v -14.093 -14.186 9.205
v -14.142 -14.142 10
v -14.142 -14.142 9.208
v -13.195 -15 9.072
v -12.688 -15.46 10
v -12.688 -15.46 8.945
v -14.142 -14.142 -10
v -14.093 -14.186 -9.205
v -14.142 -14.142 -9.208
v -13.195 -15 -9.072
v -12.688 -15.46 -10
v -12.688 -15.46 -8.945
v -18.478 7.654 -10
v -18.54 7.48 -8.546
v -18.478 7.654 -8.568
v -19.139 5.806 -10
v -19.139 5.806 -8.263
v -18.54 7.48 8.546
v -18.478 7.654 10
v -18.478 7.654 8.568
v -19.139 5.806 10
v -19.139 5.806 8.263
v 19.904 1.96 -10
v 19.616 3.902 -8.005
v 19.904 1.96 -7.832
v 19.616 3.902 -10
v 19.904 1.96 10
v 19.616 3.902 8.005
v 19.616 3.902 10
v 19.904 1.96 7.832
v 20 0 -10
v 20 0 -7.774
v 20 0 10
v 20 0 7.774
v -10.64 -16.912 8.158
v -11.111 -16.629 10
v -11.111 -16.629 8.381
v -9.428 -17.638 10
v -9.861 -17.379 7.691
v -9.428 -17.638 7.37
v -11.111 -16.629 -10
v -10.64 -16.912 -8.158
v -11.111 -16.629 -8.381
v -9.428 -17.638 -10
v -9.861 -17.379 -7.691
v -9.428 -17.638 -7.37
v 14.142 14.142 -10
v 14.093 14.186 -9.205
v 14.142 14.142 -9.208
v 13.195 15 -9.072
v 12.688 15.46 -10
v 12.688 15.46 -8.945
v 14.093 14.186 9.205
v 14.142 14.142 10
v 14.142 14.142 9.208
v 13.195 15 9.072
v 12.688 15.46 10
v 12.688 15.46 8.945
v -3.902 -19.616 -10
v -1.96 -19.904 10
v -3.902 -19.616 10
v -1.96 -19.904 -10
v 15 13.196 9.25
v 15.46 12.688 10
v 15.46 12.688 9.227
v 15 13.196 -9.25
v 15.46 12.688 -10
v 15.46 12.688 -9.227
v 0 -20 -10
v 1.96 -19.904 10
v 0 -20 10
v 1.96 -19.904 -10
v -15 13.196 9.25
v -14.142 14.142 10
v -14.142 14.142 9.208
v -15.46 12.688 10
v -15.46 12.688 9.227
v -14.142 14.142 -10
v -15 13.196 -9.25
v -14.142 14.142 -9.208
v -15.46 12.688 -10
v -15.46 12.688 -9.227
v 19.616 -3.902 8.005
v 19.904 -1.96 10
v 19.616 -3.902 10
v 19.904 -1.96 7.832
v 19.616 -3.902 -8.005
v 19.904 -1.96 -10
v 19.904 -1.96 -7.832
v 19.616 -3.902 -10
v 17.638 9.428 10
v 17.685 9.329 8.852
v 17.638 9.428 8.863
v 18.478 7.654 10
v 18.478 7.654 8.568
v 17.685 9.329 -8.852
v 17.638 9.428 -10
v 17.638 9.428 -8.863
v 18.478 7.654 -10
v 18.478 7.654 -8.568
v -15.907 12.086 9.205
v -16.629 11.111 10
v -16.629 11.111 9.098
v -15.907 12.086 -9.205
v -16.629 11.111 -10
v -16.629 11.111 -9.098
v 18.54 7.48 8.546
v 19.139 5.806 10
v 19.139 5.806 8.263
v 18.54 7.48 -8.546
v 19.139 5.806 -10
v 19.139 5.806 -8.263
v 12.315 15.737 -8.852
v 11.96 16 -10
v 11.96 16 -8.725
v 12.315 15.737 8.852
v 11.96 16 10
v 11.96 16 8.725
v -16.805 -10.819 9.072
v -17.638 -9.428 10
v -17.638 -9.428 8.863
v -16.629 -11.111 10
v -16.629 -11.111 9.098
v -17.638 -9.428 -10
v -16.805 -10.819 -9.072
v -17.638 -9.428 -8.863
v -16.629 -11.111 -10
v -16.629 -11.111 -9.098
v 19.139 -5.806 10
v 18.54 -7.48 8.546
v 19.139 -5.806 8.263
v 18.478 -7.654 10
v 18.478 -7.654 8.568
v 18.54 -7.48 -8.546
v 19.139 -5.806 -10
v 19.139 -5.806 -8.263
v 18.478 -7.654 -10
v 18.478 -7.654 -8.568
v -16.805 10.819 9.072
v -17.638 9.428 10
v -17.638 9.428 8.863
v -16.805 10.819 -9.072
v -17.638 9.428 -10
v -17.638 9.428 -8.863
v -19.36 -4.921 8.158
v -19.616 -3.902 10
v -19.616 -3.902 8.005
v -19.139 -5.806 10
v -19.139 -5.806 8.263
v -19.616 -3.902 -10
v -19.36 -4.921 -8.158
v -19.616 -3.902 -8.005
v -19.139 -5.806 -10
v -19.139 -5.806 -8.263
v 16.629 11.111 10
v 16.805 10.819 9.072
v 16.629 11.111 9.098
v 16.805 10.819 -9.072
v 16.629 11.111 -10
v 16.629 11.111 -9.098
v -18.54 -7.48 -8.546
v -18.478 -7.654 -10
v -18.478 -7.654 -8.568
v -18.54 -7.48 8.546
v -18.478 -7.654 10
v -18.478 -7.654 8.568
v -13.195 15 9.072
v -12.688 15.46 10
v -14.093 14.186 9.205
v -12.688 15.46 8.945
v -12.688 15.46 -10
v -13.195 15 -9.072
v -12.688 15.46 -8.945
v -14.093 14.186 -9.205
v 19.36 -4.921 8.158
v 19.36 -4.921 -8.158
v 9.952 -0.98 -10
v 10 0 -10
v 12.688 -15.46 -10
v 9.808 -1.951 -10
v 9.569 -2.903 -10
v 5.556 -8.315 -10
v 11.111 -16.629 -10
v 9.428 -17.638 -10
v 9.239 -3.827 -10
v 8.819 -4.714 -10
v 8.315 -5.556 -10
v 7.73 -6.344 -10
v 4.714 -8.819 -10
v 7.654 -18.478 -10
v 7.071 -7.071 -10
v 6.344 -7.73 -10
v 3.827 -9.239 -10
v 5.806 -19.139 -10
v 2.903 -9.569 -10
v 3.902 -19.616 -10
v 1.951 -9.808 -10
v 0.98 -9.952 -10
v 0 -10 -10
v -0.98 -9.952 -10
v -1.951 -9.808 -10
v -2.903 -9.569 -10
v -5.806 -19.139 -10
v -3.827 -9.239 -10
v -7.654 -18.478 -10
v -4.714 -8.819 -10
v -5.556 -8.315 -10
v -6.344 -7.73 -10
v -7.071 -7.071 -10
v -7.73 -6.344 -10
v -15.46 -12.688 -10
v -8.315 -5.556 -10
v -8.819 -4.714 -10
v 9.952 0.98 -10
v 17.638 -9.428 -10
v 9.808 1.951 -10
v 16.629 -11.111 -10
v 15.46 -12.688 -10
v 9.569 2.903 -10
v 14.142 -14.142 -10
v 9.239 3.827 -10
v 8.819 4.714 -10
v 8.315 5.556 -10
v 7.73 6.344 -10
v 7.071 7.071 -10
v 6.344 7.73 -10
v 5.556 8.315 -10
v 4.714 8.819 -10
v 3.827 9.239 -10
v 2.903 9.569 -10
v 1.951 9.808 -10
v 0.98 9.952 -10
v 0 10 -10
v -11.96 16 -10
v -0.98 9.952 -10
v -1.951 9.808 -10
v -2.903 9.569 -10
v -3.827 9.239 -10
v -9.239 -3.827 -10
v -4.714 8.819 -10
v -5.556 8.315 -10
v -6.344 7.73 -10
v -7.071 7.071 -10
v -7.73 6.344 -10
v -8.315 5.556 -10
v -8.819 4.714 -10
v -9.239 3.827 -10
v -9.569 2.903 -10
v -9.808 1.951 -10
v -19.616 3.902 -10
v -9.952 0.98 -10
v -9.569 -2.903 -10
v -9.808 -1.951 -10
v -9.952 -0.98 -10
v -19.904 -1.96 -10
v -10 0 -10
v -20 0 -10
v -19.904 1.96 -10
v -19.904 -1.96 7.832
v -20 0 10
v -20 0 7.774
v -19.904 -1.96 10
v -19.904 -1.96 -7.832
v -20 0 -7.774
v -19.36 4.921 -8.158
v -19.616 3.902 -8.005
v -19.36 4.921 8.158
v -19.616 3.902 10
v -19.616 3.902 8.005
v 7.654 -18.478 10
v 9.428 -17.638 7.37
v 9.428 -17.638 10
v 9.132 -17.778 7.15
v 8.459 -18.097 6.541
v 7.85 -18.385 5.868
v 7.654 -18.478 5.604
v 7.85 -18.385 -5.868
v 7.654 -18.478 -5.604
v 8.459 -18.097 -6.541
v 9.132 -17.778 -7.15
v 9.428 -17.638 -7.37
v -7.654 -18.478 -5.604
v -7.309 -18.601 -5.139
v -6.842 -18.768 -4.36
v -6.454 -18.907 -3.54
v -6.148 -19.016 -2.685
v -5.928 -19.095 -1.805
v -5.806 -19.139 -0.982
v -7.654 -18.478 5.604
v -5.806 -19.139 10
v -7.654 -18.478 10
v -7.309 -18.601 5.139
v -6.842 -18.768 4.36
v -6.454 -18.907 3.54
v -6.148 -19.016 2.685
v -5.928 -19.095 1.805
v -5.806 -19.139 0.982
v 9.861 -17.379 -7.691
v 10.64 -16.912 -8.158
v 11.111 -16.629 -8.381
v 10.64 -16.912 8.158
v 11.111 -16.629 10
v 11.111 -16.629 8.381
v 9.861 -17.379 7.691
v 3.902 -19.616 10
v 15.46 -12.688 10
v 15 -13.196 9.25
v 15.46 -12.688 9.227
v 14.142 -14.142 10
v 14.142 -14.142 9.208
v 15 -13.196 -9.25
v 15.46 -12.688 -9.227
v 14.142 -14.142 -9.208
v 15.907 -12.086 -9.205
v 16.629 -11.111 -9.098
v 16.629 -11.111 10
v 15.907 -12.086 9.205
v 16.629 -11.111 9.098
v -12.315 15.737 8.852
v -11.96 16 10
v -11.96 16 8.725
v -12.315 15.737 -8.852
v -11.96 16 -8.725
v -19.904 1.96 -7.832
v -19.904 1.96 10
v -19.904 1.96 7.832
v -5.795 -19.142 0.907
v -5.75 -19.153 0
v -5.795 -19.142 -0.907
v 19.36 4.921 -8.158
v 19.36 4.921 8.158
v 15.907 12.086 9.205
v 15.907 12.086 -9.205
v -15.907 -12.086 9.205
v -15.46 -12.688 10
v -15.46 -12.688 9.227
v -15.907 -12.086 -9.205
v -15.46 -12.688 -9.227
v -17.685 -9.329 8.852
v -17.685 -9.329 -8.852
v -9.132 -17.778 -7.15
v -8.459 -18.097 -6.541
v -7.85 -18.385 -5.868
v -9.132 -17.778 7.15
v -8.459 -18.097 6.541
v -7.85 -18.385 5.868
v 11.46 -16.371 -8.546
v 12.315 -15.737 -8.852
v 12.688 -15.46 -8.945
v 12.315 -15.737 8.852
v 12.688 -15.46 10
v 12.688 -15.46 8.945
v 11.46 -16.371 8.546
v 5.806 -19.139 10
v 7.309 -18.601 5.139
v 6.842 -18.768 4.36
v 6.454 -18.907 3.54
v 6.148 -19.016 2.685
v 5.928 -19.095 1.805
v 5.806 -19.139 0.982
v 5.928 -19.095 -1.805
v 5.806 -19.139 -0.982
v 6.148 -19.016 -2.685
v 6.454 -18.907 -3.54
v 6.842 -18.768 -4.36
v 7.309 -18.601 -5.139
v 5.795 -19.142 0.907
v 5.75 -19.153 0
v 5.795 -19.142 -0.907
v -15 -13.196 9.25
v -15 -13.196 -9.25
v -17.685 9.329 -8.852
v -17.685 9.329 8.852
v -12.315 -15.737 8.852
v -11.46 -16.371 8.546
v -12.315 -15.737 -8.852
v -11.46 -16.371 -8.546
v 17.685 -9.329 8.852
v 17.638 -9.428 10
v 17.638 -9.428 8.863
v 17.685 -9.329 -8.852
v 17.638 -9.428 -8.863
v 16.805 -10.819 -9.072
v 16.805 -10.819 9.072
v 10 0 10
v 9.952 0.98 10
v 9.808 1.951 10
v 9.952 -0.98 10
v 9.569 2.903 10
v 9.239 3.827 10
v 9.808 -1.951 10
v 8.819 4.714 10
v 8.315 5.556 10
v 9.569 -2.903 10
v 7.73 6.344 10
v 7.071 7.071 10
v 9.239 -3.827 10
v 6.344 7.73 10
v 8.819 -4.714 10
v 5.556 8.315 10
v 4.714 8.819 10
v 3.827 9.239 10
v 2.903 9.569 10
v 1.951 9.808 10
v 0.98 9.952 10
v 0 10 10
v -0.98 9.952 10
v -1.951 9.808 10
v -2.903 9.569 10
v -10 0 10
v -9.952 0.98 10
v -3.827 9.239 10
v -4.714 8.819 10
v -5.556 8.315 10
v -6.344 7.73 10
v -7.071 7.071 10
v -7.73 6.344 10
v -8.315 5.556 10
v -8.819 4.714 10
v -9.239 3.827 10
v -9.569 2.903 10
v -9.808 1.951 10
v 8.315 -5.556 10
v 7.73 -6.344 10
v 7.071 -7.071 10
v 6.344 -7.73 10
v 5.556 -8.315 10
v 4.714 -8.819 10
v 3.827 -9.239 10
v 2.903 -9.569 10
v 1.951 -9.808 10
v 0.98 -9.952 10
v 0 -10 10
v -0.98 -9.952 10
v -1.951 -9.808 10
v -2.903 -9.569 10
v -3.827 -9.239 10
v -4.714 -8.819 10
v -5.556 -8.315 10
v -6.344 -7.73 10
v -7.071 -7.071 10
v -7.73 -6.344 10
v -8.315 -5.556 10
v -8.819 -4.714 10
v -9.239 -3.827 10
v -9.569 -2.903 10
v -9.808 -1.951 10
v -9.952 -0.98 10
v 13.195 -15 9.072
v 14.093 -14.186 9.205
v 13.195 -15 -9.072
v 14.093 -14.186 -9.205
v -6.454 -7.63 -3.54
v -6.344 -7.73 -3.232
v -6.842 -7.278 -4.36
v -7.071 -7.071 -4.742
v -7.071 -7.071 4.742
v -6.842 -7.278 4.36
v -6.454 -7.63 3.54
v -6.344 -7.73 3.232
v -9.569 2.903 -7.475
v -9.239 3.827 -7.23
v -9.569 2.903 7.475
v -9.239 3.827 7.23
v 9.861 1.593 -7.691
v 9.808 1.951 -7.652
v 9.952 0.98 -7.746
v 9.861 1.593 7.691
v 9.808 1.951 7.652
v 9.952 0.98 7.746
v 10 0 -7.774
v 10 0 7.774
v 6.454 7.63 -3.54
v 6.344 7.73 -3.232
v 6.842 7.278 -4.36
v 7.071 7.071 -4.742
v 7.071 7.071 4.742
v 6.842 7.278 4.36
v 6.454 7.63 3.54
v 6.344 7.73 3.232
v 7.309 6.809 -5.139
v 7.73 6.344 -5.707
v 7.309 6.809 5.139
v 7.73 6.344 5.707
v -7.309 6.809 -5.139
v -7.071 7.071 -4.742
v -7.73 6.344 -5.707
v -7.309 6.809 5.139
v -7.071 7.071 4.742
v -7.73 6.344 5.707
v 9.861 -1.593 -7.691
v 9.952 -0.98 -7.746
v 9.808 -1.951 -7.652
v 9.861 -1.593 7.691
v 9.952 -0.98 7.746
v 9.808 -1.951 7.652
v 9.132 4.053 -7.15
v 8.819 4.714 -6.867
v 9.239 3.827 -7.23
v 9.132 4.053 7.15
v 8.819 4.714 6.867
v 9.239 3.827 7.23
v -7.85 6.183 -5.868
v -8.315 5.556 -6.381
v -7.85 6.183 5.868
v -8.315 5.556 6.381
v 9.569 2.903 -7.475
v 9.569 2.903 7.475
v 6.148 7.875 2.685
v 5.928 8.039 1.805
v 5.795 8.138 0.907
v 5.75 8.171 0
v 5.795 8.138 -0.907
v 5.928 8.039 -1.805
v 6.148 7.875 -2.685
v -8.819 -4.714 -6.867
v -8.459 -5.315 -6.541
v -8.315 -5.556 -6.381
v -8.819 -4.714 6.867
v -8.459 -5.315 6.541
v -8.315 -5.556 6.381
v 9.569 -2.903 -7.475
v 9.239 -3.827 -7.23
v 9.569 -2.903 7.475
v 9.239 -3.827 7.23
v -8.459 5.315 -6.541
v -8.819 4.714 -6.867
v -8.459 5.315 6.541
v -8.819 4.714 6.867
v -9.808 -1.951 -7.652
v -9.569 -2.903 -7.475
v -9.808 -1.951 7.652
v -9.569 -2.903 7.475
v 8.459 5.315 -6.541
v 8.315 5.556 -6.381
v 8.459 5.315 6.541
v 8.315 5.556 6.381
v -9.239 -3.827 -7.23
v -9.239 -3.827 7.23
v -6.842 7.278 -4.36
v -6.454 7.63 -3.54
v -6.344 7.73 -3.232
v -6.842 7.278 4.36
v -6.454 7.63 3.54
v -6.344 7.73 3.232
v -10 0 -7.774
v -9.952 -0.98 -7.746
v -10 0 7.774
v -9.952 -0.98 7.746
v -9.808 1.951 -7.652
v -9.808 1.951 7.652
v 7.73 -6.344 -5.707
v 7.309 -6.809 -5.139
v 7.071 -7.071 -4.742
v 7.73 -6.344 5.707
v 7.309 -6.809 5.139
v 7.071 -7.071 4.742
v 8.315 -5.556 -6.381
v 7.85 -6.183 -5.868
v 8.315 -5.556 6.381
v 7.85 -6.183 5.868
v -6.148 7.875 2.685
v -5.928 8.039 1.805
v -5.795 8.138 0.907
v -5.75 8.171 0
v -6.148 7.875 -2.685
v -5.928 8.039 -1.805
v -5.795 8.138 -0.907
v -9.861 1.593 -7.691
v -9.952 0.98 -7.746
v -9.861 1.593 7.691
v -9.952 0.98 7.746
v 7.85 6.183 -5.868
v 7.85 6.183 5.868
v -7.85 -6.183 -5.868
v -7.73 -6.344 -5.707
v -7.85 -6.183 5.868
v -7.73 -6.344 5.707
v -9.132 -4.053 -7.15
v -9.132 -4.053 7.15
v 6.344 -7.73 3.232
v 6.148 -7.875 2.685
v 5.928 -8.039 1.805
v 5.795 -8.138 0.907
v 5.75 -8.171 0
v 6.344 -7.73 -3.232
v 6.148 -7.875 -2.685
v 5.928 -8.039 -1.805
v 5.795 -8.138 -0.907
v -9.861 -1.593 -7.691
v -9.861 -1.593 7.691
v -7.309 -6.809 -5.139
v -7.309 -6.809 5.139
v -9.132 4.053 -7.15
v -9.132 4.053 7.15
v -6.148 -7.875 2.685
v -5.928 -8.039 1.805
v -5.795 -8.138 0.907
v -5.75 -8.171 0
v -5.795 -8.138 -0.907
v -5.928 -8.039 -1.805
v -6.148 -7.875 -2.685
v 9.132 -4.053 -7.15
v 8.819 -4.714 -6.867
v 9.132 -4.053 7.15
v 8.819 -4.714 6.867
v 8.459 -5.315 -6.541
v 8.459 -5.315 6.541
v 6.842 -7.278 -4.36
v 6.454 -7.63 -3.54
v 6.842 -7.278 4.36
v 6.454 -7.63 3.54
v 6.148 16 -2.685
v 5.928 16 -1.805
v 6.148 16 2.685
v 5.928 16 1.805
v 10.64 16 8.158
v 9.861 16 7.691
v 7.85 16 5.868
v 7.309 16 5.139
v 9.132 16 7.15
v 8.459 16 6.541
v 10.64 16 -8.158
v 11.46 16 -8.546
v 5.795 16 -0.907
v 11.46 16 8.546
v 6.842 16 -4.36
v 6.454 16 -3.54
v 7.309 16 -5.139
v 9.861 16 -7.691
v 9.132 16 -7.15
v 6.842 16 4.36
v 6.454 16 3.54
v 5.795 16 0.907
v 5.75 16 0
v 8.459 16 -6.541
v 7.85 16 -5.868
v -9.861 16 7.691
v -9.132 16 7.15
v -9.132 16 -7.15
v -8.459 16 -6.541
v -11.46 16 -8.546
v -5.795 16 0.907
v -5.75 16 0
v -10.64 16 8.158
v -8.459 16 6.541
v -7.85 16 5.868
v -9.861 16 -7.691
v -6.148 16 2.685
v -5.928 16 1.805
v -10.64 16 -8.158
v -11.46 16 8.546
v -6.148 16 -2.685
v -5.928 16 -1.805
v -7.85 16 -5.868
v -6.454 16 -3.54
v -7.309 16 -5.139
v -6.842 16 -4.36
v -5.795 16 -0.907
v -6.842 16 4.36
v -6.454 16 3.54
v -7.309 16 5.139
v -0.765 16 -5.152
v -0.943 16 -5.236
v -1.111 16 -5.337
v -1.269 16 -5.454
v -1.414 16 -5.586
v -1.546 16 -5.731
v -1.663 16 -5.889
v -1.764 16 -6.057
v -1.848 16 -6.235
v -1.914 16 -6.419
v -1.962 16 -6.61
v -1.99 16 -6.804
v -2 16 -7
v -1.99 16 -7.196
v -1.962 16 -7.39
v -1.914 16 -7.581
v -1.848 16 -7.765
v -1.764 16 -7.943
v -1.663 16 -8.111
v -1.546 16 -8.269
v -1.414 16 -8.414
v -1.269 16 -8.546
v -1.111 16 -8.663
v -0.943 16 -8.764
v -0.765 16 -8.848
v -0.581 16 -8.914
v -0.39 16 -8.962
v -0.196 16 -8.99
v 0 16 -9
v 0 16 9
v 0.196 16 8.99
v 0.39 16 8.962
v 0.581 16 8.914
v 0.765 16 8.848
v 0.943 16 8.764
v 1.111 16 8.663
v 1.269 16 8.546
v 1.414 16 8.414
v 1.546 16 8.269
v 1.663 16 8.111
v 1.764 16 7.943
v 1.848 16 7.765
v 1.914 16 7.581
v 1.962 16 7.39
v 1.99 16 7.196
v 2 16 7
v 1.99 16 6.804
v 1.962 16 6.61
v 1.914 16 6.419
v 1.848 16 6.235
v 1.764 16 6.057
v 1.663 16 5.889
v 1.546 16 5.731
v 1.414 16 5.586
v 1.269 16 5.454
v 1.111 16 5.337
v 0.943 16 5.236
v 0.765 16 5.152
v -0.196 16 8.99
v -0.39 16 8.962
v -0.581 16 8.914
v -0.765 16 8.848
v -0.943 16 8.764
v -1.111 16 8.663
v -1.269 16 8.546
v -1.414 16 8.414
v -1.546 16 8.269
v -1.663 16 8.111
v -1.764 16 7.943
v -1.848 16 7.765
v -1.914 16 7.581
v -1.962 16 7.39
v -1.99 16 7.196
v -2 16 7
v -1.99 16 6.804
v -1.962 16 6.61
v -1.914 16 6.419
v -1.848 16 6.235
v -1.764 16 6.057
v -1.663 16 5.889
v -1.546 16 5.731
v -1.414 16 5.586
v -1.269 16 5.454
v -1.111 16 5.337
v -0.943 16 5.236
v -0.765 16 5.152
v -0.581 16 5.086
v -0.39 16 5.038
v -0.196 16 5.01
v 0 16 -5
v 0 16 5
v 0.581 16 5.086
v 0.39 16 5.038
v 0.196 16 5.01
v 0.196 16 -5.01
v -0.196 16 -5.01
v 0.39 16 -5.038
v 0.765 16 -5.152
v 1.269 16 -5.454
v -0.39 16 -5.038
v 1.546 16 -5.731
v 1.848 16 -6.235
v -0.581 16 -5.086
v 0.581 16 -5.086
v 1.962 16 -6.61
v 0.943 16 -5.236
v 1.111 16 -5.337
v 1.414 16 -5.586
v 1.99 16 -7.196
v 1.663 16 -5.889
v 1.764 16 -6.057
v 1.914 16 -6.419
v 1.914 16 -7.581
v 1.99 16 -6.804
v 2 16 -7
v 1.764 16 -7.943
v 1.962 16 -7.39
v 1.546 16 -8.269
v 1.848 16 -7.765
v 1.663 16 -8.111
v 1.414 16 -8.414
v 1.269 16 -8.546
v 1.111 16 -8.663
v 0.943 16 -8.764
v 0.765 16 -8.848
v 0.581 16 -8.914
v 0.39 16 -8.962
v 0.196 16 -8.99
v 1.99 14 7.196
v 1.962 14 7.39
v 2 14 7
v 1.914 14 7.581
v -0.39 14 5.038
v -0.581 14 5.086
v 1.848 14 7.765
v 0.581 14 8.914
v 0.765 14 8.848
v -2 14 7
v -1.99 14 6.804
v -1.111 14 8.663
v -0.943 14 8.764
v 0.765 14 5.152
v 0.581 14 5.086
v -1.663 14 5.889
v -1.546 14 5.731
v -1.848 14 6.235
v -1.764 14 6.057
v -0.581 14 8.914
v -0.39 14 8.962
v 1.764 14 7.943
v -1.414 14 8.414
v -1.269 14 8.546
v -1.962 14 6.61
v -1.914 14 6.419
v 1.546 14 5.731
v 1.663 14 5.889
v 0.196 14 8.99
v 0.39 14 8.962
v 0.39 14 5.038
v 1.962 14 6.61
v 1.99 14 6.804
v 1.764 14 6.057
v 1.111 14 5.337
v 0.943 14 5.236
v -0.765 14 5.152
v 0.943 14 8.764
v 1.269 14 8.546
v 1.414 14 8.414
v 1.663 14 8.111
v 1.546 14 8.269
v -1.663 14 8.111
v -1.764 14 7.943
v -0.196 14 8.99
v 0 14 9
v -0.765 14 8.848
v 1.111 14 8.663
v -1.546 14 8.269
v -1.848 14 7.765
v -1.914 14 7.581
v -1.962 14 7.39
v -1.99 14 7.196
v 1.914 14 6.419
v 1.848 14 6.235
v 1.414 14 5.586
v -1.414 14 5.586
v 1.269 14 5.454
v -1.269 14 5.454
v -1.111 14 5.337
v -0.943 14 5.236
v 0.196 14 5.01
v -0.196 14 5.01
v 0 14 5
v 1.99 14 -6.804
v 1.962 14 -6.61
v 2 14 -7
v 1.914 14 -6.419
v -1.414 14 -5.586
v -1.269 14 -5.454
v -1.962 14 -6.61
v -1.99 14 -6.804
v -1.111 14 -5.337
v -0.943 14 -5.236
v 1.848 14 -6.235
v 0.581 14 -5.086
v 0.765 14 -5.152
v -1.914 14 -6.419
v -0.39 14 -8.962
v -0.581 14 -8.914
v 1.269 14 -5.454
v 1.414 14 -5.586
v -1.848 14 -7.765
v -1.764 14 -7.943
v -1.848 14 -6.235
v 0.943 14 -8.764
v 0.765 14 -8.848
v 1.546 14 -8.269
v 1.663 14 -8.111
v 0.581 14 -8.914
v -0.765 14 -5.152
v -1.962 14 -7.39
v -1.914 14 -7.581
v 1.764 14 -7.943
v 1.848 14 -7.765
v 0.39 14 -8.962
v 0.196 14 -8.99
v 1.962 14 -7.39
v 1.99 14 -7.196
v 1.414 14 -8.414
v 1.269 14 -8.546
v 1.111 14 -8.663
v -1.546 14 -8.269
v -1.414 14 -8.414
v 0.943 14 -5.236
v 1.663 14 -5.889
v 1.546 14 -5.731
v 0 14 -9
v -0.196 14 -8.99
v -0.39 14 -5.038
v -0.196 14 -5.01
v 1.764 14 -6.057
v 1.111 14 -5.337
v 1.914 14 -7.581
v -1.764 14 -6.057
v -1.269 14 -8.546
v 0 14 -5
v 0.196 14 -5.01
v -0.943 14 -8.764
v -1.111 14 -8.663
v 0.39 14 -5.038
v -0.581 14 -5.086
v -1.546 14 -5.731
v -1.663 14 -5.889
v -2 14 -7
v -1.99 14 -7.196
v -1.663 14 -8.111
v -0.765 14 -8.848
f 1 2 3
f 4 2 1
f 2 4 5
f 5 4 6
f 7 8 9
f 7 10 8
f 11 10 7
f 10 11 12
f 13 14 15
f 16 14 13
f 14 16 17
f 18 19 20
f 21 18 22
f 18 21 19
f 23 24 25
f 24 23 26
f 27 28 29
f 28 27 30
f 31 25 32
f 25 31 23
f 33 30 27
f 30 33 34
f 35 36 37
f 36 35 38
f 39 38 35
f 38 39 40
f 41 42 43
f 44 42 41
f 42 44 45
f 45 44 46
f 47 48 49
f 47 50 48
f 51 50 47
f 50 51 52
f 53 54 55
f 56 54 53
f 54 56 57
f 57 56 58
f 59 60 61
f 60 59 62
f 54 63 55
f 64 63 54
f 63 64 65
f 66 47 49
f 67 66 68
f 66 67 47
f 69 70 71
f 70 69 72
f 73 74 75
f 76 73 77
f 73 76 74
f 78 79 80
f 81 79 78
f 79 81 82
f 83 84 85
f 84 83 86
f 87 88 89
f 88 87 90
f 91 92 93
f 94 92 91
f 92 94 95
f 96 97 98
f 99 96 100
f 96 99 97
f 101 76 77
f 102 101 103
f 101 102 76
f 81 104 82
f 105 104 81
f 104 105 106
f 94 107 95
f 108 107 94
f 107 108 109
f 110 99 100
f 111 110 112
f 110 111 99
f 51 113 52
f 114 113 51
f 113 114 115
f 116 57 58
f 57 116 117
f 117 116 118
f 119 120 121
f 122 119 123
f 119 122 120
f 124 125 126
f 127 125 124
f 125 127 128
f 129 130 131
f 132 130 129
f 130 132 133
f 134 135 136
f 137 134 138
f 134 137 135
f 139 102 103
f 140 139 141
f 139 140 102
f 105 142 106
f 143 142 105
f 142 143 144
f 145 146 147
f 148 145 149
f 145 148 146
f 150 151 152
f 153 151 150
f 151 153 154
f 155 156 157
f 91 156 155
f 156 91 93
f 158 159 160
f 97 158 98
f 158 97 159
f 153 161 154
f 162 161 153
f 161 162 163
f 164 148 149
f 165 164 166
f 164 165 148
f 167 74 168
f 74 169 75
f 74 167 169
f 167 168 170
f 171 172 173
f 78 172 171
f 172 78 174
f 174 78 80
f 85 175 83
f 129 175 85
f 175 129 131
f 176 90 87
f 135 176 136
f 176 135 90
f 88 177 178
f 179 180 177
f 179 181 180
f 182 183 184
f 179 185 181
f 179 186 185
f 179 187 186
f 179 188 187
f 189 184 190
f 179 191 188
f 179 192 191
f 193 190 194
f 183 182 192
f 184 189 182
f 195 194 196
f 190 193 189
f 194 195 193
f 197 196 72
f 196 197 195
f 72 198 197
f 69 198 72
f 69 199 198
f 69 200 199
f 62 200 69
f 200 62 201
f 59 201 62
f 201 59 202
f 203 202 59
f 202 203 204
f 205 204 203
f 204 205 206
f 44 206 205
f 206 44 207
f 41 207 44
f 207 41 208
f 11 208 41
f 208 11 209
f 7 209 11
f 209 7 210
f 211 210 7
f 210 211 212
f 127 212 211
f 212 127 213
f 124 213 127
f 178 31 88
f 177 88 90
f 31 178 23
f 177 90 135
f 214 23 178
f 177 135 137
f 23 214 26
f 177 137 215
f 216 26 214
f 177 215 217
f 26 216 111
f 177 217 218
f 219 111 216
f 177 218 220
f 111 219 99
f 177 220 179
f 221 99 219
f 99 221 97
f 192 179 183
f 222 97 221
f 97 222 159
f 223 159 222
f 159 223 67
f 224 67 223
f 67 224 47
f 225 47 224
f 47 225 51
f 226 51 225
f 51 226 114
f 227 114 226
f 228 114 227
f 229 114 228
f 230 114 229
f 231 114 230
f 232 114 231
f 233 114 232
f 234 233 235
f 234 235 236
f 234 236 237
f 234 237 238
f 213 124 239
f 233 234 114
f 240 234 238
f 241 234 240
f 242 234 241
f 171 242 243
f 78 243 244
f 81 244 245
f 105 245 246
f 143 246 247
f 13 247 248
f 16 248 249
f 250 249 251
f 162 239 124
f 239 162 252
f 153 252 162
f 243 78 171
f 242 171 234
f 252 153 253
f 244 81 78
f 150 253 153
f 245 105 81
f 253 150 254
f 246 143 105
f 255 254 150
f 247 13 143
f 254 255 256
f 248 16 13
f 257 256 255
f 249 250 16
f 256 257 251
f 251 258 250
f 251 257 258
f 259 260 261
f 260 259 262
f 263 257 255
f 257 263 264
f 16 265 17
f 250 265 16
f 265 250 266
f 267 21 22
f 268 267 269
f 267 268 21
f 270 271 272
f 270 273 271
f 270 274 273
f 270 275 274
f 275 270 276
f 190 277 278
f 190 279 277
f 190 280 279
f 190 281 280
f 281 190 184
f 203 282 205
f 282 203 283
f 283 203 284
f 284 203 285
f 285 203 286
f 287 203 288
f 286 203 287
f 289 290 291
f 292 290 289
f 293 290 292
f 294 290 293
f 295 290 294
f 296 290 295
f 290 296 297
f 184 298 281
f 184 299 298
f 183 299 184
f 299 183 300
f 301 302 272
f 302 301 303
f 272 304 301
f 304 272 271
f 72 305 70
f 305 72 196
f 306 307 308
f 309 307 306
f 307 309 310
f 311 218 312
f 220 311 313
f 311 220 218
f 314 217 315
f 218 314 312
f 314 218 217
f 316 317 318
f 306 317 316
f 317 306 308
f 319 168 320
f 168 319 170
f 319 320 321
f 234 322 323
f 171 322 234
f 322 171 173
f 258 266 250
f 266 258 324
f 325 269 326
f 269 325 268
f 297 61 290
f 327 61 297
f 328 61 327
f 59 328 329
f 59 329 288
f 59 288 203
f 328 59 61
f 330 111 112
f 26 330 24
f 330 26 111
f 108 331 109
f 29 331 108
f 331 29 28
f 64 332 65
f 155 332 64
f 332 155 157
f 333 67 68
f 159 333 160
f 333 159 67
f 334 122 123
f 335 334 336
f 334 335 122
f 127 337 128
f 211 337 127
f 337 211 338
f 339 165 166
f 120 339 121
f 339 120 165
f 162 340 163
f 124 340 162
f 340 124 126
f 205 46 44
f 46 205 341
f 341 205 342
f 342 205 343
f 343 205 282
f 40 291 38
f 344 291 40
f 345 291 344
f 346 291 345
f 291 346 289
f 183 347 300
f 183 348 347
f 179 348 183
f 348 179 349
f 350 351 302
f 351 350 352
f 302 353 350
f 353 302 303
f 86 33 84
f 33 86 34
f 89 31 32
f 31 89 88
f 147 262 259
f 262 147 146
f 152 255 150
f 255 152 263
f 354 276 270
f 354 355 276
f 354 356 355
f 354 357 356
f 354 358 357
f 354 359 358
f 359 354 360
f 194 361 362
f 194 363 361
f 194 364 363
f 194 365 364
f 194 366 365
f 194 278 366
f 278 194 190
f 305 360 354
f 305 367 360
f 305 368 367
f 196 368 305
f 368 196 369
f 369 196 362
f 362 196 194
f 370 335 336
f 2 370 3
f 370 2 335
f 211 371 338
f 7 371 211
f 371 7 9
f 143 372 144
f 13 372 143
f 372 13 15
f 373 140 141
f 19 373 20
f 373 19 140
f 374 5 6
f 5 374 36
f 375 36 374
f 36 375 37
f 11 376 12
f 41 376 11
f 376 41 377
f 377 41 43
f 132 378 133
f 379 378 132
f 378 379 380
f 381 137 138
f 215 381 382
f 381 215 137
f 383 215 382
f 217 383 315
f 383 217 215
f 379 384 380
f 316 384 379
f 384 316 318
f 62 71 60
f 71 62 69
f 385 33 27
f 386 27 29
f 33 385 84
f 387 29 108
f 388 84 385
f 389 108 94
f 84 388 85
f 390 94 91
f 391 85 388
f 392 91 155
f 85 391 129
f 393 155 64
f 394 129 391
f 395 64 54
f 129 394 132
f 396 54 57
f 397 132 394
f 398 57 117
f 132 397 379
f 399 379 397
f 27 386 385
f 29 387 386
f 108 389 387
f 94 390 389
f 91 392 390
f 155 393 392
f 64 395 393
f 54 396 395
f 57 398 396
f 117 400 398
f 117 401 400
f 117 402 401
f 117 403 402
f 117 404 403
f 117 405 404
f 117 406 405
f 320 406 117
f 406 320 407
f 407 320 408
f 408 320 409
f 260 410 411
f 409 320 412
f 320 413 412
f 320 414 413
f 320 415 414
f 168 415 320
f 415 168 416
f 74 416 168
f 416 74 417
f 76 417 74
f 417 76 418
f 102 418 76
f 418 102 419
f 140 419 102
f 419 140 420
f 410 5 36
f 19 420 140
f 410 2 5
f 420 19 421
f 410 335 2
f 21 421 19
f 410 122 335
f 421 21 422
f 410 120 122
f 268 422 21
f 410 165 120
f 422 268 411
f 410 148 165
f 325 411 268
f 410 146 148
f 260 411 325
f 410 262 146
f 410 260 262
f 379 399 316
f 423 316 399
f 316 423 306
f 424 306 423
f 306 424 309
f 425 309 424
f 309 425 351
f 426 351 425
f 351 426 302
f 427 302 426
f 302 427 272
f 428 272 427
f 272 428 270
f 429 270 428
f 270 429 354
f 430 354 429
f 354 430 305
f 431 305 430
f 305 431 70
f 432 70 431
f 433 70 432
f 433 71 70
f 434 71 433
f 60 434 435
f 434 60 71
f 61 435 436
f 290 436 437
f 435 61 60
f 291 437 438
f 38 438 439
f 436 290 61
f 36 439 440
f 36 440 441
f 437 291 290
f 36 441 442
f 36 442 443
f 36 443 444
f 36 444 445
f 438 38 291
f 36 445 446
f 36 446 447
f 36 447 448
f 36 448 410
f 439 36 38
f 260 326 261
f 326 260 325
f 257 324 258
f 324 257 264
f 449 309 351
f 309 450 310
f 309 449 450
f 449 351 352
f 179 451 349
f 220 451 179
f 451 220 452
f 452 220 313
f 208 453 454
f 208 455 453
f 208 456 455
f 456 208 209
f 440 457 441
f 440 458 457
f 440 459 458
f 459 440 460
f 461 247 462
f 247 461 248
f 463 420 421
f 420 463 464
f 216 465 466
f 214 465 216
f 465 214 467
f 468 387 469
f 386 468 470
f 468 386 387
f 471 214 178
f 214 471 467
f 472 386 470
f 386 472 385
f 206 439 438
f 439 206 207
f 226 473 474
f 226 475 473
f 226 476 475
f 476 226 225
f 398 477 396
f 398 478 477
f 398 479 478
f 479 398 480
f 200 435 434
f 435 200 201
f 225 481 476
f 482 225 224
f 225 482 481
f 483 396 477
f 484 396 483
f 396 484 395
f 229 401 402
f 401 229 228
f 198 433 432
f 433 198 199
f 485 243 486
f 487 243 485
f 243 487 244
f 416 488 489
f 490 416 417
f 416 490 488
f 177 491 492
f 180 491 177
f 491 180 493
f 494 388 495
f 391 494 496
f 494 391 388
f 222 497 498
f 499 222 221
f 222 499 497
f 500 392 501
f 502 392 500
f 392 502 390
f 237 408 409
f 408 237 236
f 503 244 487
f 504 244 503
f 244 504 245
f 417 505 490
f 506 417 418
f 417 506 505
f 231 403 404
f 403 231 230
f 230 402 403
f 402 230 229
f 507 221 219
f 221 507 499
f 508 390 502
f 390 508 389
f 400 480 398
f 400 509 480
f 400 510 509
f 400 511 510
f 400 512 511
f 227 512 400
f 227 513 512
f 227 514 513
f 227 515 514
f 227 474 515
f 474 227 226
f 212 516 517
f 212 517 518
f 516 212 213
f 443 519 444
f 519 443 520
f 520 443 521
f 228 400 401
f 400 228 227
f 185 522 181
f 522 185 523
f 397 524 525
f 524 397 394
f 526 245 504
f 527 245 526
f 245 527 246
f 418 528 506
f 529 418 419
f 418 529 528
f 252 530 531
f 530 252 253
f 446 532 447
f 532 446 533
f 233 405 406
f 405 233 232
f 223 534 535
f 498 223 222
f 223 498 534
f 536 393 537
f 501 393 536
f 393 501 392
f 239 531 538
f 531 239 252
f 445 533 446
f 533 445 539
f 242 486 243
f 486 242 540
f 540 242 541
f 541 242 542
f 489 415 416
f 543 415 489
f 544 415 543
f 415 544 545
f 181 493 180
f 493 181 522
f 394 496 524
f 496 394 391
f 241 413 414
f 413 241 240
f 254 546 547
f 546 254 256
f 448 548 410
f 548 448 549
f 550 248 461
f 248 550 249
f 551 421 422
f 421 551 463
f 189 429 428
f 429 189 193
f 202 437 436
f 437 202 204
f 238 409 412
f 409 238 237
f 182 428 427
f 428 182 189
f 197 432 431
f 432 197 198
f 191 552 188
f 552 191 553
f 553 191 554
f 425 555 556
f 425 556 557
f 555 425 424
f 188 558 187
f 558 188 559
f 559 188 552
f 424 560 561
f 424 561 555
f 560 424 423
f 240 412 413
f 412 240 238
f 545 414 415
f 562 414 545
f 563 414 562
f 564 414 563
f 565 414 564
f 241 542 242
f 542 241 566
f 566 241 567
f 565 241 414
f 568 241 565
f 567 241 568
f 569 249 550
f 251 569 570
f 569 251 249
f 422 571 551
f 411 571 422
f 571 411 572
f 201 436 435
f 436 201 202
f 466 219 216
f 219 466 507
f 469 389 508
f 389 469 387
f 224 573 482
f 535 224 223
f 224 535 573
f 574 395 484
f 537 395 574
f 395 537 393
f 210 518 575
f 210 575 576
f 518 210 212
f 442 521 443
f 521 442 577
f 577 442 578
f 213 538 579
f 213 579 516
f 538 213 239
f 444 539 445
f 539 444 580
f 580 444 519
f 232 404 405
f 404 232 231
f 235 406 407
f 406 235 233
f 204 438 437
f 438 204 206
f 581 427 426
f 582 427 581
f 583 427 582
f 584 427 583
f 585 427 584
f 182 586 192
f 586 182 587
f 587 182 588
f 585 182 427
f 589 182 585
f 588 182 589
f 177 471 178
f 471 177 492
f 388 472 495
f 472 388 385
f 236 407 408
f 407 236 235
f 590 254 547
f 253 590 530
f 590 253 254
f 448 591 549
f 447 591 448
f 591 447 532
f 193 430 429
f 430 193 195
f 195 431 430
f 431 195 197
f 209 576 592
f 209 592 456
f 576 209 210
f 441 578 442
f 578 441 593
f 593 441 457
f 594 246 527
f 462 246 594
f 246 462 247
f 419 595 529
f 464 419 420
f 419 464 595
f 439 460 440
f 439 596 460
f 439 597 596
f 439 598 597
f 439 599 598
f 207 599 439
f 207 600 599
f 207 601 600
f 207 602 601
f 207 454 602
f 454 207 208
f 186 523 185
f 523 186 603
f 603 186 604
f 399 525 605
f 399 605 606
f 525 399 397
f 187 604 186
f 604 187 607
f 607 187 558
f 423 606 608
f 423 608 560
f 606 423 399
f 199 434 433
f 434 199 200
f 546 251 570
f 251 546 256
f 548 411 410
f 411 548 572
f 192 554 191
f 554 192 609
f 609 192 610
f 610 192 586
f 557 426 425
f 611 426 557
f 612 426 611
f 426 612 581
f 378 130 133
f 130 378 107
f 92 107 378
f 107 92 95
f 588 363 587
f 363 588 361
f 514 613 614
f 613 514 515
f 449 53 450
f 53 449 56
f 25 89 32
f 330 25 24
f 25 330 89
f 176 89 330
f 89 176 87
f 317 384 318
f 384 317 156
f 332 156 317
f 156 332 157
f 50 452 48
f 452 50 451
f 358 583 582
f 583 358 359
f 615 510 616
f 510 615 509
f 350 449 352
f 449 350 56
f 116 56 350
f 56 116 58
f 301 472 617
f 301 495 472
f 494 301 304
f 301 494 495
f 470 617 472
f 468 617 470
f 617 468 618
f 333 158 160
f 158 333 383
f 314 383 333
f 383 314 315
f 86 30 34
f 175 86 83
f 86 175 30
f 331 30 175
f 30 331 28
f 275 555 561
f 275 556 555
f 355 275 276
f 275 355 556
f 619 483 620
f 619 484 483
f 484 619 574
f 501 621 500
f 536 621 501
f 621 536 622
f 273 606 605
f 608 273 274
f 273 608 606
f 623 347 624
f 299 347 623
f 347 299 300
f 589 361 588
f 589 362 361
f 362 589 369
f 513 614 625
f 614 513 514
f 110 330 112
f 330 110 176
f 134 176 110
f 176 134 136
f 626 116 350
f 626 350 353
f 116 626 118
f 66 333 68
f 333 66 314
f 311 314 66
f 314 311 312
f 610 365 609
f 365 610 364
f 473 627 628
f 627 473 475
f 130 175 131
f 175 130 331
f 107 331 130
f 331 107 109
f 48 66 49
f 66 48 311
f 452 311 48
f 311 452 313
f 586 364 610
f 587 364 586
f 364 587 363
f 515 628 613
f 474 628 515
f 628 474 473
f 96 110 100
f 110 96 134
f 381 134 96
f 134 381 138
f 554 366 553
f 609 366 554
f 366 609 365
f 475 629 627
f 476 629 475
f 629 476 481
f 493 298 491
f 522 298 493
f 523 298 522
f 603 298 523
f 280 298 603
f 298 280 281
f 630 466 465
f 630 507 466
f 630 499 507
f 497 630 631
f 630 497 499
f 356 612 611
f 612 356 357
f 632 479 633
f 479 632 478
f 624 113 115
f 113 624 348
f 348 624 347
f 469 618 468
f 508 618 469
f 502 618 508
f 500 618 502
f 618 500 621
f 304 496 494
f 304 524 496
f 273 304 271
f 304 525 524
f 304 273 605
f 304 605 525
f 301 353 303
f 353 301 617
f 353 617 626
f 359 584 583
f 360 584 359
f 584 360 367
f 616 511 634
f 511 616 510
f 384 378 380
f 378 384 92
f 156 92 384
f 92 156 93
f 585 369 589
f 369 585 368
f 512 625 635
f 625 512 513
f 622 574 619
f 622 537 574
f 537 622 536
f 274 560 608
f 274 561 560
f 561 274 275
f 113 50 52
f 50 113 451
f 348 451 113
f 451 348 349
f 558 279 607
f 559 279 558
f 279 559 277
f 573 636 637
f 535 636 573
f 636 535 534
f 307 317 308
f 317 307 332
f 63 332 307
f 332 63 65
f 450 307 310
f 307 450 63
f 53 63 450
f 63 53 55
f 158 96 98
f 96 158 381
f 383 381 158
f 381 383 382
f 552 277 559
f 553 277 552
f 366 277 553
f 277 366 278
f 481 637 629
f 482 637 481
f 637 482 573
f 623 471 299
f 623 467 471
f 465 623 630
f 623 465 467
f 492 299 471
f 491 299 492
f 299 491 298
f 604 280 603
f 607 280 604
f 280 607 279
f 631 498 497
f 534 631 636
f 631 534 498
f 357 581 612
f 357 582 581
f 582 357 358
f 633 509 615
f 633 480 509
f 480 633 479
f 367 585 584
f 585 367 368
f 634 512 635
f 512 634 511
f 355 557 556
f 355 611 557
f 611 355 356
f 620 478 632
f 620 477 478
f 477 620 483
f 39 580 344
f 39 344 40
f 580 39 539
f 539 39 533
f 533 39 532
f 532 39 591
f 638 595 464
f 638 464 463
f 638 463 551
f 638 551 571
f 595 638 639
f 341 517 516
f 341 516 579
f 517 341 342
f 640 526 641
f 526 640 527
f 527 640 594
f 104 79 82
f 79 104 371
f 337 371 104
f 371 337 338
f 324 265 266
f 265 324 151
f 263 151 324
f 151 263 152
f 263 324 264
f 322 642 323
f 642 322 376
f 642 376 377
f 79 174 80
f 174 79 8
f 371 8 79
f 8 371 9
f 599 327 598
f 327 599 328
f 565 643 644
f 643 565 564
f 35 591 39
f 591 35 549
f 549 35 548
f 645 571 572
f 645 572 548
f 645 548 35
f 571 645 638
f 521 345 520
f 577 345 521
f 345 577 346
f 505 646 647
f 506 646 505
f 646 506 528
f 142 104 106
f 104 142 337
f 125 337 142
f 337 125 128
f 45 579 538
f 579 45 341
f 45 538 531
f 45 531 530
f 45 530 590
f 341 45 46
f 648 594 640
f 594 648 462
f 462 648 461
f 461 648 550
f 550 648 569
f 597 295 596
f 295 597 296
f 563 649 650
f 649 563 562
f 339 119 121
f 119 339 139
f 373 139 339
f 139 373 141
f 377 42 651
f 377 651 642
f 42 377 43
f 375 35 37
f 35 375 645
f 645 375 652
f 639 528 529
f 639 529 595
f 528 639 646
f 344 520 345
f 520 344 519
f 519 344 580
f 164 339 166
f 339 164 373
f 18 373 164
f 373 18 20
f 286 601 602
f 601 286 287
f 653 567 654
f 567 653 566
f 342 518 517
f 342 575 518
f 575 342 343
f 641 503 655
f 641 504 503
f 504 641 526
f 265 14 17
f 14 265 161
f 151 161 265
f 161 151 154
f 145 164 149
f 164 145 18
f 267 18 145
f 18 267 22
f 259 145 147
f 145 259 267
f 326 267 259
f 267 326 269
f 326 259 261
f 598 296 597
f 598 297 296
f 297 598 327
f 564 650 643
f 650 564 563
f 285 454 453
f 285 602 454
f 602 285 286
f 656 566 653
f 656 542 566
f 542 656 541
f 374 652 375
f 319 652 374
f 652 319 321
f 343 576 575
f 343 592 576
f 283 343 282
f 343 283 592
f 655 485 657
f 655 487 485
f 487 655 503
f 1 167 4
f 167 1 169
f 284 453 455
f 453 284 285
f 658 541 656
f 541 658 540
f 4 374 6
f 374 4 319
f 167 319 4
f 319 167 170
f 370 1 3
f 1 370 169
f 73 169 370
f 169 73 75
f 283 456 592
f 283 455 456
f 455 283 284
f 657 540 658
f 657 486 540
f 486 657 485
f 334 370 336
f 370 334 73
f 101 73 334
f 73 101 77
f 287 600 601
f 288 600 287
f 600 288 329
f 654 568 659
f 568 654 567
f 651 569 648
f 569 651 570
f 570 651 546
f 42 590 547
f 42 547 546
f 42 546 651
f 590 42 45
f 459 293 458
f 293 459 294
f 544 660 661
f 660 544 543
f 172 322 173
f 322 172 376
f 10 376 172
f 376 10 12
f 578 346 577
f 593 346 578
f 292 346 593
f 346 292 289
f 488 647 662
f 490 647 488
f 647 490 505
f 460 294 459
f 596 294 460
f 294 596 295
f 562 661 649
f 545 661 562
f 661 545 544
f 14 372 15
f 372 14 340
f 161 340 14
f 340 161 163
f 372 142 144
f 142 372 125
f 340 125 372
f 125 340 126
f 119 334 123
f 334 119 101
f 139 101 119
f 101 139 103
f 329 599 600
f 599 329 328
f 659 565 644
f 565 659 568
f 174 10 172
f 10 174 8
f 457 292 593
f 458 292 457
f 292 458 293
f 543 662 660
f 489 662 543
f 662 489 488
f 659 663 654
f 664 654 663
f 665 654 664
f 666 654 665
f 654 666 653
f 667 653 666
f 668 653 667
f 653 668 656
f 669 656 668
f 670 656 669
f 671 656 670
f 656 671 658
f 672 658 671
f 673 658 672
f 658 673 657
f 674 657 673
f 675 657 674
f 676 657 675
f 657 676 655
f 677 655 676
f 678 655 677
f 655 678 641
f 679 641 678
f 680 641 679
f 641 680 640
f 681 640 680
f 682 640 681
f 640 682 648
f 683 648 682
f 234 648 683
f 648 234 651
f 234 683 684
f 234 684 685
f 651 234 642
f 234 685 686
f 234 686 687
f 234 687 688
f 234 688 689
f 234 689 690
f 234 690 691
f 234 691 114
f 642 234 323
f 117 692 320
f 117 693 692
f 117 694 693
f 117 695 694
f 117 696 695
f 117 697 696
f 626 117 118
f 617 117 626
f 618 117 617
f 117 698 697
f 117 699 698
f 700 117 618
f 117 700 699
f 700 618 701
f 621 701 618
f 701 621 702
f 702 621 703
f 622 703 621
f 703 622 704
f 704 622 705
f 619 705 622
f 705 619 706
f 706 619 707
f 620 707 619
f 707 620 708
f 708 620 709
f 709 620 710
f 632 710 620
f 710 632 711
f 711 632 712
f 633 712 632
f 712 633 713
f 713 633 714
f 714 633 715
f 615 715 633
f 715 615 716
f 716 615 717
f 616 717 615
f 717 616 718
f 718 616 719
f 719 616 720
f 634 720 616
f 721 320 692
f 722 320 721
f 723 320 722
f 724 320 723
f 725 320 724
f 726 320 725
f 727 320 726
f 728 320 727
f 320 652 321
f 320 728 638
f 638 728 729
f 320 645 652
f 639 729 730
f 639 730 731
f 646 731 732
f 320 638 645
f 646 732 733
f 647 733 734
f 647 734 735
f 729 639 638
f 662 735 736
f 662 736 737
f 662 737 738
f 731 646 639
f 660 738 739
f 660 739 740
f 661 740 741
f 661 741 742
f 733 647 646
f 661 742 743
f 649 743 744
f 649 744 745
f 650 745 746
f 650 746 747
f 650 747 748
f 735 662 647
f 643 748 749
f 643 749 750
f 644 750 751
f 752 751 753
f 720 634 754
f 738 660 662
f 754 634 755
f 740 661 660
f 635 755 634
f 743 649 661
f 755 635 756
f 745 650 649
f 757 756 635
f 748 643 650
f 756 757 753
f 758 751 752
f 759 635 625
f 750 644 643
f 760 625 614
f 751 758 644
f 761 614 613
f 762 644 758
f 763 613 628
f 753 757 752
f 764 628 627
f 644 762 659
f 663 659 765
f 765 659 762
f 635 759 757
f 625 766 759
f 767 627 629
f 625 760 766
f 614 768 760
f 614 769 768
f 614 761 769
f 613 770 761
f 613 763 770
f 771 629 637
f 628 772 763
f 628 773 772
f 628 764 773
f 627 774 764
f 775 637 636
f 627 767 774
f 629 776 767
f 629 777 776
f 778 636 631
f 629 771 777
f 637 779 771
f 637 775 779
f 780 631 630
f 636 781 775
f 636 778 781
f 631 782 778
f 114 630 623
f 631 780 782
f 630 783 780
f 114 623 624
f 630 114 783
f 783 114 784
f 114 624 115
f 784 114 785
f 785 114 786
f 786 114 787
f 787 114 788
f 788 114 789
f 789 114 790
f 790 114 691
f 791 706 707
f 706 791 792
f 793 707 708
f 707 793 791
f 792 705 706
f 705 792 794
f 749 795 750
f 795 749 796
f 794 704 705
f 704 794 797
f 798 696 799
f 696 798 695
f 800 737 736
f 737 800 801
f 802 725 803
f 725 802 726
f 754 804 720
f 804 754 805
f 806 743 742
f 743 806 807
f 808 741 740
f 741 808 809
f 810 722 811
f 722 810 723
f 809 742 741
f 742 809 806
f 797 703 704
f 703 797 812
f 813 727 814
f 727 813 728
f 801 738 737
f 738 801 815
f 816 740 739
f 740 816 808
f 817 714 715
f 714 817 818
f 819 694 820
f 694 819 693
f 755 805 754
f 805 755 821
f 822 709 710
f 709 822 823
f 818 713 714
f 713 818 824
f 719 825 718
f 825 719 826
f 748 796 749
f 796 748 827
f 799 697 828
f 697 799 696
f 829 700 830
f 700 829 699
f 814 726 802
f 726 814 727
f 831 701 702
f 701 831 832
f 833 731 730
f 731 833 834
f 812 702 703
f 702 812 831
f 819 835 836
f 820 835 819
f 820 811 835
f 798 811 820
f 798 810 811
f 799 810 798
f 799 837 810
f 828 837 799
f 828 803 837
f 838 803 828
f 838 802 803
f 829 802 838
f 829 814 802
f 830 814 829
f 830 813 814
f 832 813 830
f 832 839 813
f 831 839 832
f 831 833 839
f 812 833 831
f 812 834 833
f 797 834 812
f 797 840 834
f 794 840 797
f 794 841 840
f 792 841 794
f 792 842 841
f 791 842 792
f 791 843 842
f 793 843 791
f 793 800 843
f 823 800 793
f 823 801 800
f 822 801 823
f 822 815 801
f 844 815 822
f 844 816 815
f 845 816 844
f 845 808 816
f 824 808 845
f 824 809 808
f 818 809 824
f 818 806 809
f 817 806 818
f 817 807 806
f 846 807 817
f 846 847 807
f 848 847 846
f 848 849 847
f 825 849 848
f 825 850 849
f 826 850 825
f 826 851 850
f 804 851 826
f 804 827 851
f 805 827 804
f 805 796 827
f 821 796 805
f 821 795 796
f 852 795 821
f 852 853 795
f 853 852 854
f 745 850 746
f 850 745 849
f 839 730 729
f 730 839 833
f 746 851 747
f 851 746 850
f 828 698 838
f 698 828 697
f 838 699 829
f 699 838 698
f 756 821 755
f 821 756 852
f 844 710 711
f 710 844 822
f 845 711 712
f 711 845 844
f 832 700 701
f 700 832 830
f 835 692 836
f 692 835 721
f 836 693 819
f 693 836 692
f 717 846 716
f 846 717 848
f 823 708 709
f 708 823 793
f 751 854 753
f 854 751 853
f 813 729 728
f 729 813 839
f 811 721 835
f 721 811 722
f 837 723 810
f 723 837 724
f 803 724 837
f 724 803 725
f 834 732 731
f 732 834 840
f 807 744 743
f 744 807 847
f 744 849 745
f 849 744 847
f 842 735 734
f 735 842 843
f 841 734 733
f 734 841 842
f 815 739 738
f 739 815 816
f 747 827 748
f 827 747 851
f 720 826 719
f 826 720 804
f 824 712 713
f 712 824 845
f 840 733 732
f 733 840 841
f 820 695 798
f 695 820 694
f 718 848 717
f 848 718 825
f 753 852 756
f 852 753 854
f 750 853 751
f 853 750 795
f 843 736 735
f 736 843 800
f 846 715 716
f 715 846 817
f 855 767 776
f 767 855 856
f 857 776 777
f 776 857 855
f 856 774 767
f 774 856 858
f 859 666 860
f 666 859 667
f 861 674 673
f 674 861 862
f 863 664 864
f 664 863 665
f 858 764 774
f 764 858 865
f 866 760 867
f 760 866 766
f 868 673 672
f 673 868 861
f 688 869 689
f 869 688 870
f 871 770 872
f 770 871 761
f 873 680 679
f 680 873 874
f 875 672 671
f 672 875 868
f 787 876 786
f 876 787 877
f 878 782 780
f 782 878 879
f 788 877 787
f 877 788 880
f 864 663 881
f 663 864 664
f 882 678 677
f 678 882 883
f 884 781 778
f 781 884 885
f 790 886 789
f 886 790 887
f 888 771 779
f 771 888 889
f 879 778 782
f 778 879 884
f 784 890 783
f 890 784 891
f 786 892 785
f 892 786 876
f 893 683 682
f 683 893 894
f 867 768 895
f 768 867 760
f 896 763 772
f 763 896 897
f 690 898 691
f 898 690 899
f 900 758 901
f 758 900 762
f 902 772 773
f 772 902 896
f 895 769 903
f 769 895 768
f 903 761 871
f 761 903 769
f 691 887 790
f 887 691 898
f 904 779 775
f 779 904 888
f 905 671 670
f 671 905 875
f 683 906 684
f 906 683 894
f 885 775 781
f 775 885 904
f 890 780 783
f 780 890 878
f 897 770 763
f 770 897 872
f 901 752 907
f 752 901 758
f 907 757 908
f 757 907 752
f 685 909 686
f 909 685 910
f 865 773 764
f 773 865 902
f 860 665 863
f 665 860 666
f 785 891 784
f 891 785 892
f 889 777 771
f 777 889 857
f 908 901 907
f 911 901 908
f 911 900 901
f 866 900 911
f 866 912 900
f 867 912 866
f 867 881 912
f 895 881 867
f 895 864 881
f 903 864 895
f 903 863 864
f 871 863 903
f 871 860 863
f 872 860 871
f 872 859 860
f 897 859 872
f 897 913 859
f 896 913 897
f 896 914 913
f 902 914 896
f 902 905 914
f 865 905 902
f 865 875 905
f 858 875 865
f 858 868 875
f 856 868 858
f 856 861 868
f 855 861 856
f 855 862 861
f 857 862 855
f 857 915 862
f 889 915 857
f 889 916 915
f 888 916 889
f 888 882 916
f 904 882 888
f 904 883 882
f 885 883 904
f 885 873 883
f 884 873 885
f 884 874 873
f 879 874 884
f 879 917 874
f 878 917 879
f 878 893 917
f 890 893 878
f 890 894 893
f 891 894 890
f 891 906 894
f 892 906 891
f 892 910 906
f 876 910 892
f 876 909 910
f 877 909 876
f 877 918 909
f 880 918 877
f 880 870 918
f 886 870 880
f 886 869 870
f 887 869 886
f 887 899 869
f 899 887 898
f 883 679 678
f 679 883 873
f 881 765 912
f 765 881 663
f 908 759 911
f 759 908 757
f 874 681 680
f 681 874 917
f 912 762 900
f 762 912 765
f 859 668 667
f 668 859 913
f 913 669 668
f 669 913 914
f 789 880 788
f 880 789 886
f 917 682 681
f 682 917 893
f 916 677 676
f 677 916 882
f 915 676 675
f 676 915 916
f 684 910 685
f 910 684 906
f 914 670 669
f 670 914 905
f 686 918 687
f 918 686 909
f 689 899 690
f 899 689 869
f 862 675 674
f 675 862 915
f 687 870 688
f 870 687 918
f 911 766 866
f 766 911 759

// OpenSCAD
// COBRA Vertebra - T3 V9
// Height: 20.0mm, OD: 40.0mm

$fn = 64;

difference() {
    // Outer cylinder
    cylinder(h=20.0, d=40.0, center=true);
    
    // Inner channel
    cylinder(h=22.0, d=20.0, center=true);

    // Battery cavity 1
    rotate([0, 0, 0])
    translate([15.0, 0, 0])
    rotate([90, 0, 0])
    cylinder(h=74.0, d=18.5, center=true);

    // Battery cavity 2
    rotate([0, 0, 180])
    translate([15.0, 0, 0])
    rotate([90, 0, 0])
    cylinder(h=74.0, d=18.5, center=true);

    // Solar panel cavity
    translate([0, 18.0, 0])
    cube([50, 4, 30], center=true);

    // Pivot holes
    translate([0, 20.0, 7.0])
    rotate([90, 0, 0])
    cylinder(h=12.0, d=4, center=true);
    
    translate([0, 20.0, -7.0])
    rotate([90, 0, 0])
    cylinder(h=12.0, d=4, center=true);
}
